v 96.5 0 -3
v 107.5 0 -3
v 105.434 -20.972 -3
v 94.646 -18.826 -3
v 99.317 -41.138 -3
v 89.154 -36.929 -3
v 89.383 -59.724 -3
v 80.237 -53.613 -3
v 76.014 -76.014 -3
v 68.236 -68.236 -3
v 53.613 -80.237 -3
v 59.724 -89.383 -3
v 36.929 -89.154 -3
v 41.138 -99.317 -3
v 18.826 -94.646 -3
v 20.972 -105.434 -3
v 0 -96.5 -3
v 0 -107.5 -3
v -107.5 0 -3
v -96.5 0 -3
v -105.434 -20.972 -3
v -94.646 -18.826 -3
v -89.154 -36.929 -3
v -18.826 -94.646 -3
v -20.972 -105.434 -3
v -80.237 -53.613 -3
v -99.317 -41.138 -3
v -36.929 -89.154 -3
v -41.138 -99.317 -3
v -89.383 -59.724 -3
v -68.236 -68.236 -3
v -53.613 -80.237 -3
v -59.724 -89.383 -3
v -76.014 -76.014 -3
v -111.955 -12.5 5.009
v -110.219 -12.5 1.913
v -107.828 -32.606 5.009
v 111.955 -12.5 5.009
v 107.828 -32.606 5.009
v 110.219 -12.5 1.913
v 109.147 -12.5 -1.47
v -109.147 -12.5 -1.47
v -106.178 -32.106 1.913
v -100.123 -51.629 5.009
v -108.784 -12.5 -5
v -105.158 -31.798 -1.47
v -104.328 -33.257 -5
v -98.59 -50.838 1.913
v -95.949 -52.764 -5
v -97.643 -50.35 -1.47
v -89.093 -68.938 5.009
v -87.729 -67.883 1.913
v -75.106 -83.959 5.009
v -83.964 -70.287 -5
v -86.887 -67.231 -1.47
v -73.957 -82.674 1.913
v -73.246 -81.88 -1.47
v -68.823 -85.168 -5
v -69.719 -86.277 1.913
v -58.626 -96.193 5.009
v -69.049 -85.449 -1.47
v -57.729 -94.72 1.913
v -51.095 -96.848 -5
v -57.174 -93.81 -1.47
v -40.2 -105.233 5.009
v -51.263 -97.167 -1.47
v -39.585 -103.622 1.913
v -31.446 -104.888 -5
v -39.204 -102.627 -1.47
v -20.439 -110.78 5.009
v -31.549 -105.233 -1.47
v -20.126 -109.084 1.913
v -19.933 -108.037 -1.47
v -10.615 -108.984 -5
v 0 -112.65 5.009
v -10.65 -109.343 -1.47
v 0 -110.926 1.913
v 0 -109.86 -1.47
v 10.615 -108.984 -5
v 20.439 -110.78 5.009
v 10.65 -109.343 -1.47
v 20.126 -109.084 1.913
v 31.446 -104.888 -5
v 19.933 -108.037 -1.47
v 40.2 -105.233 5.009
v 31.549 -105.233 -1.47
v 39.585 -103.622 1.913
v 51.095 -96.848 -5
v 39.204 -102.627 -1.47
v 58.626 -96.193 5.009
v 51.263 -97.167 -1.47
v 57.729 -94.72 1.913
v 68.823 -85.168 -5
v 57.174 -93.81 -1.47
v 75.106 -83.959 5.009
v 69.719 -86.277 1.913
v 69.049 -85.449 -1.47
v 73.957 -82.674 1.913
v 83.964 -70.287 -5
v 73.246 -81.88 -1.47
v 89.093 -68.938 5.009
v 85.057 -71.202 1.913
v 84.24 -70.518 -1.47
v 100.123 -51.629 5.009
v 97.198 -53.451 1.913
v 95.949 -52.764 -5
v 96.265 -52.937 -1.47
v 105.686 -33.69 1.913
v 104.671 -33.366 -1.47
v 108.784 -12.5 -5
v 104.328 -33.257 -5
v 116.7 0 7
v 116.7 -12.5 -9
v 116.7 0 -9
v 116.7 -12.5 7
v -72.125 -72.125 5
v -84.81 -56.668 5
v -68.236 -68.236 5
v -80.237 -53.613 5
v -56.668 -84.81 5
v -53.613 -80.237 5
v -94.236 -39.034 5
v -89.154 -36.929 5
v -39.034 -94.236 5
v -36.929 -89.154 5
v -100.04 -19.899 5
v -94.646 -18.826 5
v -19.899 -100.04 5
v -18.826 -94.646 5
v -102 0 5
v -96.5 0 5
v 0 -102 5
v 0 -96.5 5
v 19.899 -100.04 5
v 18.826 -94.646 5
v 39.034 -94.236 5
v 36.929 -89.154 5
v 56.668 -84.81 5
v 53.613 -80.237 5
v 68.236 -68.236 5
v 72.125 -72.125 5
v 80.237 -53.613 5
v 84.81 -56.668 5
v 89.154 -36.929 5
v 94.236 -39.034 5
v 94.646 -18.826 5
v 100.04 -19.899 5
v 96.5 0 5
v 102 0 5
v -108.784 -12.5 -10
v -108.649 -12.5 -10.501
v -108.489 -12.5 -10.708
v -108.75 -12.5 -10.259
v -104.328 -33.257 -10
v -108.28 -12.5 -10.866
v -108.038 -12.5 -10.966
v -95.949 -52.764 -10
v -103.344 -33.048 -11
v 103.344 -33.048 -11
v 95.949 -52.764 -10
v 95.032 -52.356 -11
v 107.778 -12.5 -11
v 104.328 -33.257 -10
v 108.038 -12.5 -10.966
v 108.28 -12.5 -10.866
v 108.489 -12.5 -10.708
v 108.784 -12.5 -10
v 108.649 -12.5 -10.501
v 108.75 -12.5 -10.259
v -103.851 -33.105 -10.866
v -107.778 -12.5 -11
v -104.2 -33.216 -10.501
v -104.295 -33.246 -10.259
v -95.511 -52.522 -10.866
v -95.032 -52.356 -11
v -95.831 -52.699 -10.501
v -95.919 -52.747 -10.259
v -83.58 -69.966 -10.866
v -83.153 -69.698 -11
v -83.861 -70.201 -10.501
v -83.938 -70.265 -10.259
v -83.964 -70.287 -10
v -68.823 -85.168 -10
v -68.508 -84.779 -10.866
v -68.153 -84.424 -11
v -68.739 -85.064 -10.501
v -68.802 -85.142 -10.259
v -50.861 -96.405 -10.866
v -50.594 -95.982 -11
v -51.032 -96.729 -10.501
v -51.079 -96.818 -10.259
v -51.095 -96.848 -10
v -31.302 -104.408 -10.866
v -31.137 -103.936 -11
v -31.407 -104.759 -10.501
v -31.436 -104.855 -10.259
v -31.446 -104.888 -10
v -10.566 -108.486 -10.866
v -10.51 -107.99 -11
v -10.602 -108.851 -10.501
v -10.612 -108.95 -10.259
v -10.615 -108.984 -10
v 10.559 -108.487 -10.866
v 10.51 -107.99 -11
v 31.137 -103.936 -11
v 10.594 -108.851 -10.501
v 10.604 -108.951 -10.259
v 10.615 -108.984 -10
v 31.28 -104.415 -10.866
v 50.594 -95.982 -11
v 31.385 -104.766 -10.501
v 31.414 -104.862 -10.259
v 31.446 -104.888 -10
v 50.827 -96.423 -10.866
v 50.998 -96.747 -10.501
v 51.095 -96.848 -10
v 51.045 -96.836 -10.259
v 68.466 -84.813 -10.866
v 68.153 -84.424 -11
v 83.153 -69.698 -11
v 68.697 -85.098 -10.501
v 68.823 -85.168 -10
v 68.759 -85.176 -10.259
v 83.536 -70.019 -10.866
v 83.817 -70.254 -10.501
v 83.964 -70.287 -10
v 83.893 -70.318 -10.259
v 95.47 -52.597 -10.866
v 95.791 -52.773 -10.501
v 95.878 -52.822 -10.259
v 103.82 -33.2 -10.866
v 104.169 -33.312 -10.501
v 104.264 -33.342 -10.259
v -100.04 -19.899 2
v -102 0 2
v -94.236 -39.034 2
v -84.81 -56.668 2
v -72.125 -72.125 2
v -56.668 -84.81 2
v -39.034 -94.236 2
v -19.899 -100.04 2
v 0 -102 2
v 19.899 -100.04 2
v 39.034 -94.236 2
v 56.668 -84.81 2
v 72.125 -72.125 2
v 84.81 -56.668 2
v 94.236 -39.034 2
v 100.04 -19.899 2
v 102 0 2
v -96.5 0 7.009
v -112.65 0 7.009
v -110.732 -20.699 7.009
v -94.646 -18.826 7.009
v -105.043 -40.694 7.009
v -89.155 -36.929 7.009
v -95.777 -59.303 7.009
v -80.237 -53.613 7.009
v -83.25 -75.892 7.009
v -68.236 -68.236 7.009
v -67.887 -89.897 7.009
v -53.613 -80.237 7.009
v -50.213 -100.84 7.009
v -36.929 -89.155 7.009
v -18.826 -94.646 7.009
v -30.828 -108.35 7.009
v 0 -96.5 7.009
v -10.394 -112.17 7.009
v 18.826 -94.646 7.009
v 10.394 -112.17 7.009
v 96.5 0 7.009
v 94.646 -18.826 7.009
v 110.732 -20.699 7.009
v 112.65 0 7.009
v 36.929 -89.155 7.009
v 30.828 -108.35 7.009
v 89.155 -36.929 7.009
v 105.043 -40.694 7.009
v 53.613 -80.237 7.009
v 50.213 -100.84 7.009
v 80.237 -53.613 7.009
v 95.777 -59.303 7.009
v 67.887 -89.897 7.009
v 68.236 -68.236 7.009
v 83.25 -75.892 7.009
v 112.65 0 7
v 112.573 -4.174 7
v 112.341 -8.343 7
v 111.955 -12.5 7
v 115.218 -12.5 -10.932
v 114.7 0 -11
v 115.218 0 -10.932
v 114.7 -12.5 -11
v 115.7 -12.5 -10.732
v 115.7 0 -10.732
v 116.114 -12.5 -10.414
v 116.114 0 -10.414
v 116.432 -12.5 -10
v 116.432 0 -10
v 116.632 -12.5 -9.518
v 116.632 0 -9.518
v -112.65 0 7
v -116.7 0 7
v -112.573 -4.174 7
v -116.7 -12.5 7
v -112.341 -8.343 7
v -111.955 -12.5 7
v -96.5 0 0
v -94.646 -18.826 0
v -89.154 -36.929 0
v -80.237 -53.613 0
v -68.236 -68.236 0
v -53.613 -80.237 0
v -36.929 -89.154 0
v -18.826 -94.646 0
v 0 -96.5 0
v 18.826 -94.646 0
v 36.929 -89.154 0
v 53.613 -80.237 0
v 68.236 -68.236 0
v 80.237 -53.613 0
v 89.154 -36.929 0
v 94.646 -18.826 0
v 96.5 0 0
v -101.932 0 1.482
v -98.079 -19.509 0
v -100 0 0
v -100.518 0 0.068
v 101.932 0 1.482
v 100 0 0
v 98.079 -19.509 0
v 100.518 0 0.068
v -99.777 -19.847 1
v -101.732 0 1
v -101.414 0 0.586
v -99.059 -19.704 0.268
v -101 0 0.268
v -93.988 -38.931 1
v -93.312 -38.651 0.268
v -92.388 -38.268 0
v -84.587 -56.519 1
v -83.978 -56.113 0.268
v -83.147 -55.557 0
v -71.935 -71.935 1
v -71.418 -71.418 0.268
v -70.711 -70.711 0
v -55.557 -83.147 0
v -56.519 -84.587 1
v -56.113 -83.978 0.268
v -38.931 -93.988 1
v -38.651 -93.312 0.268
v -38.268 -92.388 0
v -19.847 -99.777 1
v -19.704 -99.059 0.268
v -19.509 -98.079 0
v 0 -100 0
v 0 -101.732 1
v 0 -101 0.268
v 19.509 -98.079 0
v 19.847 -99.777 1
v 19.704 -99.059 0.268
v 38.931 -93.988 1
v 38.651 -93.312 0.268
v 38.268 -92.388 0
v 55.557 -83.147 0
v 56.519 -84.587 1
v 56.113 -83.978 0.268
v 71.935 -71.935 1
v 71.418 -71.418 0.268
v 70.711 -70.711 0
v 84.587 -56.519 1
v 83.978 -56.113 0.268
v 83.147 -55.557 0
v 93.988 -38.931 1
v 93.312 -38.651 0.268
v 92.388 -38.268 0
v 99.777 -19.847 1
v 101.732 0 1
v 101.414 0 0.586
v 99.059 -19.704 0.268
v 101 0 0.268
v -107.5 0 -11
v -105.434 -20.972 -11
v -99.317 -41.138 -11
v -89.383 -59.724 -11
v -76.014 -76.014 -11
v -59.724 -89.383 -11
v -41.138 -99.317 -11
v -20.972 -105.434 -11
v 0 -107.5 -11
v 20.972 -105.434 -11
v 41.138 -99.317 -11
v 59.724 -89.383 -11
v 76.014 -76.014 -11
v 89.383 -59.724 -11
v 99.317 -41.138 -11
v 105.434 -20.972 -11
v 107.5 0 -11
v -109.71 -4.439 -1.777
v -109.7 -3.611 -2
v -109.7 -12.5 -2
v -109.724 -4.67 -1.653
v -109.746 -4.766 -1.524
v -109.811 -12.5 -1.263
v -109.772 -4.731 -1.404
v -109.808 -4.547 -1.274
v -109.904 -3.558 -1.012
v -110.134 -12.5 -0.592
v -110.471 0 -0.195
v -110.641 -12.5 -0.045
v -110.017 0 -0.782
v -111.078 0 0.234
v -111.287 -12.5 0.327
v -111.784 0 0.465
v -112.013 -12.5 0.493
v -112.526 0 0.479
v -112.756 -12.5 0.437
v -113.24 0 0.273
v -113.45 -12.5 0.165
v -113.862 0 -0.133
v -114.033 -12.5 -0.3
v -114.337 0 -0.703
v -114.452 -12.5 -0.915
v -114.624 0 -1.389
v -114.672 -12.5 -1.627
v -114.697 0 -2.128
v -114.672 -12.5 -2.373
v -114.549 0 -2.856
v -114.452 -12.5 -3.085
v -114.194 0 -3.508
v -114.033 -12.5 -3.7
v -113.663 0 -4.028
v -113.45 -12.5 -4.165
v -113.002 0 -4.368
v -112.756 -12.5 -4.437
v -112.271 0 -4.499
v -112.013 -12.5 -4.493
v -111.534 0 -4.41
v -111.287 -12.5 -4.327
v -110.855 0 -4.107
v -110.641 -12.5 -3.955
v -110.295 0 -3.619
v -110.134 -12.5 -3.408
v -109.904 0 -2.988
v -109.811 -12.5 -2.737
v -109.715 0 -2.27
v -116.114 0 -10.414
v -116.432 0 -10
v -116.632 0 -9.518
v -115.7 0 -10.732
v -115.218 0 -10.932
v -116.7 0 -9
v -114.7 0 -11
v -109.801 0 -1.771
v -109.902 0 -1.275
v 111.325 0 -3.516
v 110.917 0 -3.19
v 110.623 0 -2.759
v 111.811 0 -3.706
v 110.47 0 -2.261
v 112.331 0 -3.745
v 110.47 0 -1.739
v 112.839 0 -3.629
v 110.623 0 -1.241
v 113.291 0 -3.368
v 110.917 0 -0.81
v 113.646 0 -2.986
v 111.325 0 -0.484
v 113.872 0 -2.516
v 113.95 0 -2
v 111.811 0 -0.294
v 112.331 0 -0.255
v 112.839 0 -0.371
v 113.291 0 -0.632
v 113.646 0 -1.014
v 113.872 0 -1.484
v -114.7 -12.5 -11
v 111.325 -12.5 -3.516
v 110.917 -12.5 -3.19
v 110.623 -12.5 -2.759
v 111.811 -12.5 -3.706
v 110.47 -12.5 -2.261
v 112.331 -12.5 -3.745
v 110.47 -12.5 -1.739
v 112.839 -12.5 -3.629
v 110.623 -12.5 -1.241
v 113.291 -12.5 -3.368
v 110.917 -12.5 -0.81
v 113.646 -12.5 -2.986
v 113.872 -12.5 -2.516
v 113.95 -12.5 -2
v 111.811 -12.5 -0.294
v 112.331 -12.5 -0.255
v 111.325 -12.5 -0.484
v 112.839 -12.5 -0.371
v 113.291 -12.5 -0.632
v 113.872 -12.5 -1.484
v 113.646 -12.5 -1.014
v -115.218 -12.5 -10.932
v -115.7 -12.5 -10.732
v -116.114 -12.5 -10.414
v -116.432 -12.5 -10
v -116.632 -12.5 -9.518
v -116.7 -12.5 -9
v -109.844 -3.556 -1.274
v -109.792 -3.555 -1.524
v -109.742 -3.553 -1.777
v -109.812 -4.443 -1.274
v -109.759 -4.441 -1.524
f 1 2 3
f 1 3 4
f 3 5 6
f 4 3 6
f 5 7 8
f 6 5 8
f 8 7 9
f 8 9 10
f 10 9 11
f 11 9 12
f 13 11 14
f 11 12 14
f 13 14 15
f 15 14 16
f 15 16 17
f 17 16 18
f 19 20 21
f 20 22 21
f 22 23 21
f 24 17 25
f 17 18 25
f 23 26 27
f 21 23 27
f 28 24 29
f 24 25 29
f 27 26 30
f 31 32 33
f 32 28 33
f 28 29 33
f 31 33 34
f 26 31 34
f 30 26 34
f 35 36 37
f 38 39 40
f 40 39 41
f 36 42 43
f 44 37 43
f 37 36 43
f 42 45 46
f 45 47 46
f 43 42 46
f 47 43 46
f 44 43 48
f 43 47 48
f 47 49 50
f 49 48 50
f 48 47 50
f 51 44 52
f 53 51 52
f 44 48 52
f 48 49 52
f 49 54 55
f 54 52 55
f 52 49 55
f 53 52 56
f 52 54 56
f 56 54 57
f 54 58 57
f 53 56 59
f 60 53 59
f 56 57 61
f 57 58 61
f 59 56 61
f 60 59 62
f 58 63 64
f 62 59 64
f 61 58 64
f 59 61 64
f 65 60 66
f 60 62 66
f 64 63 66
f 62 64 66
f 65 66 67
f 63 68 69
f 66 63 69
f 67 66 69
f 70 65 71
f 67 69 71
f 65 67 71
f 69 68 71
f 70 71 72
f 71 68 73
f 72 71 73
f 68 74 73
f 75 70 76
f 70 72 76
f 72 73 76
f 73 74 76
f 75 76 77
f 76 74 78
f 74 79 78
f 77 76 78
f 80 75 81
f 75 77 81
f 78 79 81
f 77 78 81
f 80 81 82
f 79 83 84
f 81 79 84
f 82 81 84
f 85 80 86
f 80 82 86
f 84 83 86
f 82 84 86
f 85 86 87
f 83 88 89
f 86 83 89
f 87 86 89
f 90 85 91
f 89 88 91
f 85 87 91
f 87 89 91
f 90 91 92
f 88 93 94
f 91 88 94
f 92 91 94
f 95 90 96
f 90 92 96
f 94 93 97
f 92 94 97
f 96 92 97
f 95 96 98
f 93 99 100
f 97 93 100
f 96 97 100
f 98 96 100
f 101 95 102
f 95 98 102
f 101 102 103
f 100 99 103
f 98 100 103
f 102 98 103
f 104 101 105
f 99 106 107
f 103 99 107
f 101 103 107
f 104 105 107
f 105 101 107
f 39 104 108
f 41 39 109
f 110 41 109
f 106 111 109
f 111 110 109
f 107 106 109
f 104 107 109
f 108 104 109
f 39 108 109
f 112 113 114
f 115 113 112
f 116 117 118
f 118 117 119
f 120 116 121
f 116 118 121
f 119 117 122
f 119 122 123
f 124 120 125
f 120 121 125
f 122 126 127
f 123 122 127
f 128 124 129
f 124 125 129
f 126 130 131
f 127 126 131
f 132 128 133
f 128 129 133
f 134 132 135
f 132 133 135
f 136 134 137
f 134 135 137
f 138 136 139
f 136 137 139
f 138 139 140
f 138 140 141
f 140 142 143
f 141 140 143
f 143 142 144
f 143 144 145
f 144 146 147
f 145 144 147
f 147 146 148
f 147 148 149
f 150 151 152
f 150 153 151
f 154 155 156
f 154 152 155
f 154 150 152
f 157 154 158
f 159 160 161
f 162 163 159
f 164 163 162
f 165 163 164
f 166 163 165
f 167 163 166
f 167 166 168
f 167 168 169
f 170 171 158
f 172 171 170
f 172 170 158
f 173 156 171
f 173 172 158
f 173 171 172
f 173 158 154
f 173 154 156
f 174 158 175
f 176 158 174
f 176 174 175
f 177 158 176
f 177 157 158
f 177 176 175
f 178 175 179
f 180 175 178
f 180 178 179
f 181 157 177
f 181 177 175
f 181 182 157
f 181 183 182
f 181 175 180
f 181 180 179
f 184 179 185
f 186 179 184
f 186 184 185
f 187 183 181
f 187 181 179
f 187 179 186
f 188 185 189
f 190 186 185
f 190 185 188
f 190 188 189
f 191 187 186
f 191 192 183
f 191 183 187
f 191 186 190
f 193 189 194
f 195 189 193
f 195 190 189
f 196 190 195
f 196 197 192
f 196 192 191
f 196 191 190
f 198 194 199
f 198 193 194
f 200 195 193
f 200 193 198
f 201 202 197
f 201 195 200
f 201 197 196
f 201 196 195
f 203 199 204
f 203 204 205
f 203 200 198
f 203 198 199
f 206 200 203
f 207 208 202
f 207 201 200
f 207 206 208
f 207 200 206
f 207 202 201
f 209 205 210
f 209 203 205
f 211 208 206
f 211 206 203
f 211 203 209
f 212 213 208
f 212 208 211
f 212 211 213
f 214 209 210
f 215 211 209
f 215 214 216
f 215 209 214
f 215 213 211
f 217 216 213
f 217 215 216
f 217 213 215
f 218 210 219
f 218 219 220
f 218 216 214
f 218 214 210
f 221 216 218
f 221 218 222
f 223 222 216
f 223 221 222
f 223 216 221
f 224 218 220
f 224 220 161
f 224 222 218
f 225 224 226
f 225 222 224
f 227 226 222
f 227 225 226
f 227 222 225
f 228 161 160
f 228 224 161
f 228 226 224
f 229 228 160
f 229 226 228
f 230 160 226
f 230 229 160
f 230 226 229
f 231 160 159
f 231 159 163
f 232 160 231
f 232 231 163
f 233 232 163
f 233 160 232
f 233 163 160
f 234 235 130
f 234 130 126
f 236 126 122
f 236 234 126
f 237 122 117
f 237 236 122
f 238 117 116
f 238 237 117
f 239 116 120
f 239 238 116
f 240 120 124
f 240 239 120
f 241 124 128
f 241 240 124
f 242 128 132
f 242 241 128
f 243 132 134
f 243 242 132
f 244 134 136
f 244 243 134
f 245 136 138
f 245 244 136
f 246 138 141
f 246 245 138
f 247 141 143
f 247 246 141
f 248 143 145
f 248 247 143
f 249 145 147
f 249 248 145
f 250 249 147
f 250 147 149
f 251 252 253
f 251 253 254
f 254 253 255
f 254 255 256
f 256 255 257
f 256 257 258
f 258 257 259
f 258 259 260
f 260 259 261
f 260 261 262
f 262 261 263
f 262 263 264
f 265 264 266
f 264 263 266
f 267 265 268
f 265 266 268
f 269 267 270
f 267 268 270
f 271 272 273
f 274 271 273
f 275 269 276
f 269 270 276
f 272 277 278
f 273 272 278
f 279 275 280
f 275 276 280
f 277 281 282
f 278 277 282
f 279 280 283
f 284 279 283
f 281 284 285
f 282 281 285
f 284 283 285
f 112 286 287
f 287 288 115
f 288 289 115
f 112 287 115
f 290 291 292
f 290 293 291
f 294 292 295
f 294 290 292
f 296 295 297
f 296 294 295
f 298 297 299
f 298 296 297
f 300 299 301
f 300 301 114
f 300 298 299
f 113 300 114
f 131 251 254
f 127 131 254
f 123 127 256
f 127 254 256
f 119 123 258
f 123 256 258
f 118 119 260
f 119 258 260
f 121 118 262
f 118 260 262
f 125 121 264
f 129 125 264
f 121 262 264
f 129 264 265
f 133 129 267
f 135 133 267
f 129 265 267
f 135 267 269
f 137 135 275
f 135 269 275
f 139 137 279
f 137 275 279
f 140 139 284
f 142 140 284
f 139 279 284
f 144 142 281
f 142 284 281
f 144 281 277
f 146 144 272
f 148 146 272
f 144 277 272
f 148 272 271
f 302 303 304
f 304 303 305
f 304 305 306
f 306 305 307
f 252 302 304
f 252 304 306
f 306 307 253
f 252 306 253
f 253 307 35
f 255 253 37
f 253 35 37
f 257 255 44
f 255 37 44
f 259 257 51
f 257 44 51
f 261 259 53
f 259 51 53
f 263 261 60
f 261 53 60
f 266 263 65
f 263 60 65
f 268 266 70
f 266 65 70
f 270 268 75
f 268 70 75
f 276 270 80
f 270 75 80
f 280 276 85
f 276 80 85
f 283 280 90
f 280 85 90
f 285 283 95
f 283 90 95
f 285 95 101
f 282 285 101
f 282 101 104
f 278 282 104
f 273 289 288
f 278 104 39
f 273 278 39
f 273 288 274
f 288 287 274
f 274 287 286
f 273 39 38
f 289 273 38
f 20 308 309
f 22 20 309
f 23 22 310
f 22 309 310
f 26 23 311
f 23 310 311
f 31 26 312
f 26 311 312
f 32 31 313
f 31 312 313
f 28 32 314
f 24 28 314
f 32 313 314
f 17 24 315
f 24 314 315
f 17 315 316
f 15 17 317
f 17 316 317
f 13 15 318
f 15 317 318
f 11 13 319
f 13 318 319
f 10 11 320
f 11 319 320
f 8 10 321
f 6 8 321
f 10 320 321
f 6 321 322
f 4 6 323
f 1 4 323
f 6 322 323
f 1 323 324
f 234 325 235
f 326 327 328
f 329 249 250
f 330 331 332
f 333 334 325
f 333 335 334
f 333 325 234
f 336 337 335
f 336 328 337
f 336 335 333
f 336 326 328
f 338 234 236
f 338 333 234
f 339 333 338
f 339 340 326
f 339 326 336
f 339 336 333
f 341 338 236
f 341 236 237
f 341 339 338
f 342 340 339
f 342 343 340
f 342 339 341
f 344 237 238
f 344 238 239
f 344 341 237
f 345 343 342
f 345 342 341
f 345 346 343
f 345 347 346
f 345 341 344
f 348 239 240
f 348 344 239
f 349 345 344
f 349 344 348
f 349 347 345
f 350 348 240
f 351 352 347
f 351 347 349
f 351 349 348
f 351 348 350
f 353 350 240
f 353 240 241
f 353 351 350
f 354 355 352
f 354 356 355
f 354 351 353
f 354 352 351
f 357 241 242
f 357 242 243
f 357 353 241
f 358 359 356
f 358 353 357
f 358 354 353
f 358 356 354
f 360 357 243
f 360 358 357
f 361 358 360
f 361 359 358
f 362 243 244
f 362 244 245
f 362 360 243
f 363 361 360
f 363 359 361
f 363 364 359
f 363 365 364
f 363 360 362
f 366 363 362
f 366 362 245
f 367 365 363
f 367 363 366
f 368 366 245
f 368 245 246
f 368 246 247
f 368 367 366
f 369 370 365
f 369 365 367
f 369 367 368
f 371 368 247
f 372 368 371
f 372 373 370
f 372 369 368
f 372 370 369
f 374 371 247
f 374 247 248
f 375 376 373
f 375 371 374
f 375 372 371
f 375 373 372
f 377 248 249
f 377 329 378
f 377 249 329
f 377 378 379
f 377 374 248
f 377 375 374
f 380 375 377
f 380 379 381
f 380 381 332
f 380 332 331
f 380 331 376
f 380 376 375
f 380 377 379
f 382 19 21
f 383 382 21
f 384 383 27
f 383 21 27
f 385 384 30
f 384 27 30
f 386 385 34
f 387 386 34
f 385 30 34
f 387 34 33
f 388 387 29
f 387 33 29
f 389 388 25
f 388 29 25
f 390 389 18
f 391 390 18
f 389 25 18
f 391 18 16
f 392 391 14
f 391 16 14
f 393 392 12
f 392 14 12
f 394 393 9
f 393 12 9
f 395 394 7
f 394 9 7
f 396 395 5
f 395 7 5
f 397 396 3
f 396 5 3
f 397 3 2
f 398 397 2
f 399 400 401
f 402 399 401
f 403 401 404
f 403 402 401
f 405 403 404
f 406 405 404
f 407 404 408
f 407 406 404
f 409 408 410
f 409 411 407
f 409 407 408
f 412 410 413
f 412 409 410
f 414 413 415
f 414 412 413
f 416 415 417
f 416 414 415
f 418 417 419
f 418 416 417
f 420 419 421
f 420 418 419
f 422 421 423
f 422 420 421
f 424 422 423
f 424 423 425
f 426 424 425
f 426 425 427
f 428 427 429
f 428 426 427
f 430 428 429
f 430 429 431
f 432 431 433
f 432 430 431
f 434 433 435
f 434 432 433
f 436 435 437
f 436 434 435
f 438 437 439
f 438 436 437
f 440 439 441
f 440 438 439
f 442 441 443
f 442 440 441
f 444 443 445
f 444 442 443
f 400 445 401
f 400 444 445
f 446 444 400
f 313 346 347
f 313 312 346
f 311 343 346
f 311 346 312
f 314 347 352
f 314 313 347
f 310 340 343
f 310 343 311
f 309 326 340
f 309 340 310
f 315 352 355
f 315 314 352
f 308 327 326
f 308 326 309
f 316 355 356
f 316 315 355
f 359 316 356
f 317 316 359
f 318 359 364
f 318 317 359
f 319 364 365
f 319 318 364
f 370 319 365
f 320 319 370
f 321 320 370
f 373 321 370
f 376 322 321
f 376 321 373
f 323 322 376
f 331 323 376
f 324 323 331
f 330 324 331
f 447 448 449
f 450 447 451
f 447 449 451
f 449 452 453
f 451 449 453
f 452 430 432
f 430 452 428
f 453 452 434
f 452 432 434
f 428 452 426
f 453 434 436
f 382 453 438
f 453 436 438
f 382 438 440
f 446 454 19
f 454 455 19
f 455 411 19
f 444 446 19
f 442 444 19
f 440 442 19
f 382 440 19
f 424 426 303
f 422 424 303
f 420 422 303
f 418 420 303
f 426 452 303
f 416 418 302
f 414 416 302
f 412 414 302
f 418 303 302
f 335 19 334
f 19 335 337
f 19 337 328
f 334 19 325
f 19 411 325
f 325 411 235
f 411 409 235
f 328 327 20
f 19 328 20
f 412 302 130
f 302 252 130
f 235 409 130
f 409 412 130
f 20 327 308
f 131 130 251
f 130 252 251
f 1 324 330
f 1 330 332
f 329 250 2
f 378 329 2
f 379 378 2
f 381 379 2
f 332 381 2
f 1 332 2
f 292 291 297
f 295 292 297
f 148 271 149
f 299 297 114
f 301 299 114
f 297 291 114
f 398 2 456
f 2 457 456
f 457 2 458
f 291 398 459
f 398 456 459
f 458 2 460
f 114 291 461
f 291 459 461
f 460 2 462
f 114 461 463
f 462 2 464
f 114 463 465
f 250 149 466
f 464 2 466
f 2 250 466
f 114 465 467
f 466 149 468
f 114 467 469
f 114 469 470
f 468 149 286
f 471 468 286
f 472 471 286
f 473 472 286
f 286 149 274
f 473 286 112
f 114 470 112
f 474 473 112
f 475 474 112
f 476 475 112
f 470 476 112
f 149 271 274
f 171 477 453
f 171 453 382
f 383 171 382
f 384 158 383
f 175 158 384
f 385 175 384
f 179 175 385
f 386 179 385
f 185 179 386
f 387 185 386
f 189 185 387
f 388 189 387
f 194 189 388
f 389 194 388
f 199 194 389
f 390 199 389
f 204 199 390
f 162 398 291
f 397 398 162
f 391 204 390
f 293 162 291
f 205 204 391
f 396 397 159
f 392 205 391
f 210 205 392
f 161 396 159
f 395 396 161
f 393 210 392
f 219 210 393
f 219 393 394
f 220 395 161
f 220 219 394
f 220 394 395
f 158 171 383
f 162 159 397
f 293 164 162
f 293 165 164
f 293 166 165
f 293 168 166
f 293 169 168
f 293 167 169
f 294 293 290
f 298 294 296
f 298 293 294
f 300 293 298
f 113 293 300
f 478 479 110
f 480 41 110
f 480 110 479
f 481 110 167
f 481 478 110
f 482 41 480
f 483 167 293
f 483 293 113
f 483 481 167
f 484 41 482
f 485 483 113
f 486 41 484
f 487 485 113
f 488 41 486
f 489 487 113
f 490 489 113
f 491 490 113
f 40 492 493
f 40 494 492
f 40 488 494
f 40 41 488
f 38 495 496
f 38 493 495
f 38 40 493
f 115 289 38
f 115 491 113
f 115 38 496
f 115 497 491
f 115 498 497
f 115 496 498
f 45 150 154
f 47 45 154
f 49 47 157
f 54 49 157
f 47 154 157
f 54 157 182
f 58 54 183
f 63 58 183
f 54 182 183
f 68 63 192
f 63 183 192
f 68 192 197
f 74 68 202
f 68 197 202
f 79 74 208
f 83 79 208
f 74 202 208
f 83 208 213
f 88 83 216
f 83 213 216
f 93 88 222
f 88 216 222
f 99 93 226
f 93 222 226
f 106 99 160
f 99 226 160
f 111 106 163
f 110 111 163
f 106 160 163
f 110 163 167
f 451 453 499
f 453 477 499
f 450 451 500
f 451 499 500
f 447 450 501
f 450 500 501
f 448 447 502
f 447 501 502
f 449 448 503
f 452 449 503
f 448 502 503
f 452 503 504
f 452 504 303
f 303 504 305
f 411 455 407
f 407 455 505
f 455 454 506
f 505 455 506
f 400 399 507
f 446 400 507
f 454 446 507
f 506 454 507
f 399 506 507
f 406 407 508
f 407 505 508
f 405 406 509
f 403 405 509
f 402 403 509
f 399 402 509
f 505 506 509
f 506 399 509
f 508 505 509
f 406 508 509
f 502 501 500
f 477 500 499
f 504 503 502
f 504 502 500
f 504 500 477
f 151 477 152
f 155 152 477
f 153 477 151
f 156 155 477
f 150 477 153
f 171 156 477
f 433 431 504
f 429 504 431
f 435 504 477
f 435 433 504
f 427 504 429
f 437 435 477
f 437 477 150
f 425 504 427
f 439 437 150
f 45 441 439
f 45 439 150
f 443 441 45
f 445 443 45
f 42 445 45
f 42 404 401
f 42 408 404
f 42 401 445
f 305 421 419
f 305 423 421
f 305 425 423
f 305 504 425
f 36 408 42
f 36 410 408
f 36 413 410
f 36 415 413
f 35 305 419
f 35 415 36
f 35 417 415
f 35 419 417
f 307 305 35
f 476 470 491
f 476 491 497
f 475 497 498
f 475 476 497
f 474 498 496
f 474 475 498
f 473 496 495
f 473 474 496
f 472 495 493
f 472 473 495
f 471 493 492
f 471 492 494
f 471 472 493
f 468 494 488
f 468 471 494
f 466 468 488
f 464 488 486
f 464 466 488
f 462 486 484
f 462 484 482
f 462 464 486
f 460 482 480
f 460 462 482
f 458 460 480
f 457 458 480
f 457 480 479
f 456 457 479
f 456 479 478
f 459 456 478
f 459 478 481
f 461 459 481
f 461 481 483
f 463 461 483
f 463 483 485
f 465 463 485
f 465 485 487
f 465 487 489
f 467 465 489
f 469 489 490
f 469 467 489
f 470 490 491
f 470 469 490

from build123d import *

# Parameters (mm, degrees)
F2_R      = 102
F3_DEPTH  = 5
F4_R      = 1
F5_W      = 9
F5_H      = 18
F5_R      = 2.5
F7_DEPTH  = 12.5
F6_W      = 9
F6_H      = 18
F6_R      = 1.75
F8_DEPTH  = 12.5
F9_W      = 250
F9_H      = 100
F10_DEPTH = 150
F11_R     = 2
F12_R     = 2


with BuildPart() as f1:
    # F0 (on Front) → F1 (revolve)
    with BuildSketch(Plane.XZ):
        with BuildLine():
            Line((-107.5, -3), (-96.5, -3))
            Line((-96.5, -3), (-96.5000625723, 0))
            Line((-96.5000625723, 0), (-96.5002087619, 7.009))
            Line((-96.5002087619, 7.009), (-112.6502087619, 7.009))
            Line((-112.6502087619, 7.009), (-112.6502087619, 5.009))
            ThreePointArc((-112.6502087619, 5.009), (-110.3061458059, 0.2465201859), (-109.5, -5))
            Line((-109.5, -5), (-109.5, -11))
            Line((-109.5, -11), (-107.5, -11))
            Line((-107.5, -11), (-107.5, -3))
        make_face()
    revolve(axis=Axis((0, 0, -0.2650997043), (0, 0, 1)))

    # F2 (on Top) → F3 (cut)
    with BuildSketch(Plane.XY):
        Circle(F2_R)
    extrude(amount=F3_DEPTH, mode=Mode.SUBTRACT)

    # F4
    f4_edges = [f1.edges().sort_by_distance(p)[0] for p in [
        (109.5, 0, -11),
    ]]
    fillet(f4_edges, radius=F4_R)

    # F5 (on Front) → F7 (join, symmetric)
    with BuildSketch(Plane.XZ):
        with Locations((-112.2, -2)):
            Rectangle(F5_W, F5_H)
        with Locations((-112.2, -2)):
            Circle(F5_R, mode=Mode.SUBTRACT)
    extrude(amount=F7_DEPTH, both=True)

    # F6 (on Front) → F8 (join, symmetric)
    with BuildSketch(Plane.XZ):
        with Locations((112.2, -2)):
            Rectangle(F6_W, F6_H)
        with Locations((112.2, -2)):
            Circle(F6_R, mode=Mode.SUBTRACT)
    extrude(amount=F8_DEPTH, both=True)

    # F9 (on Front) → F10 (cut)
    with BuildSketch(Plane.XZ):
        with Locations((0.1239156971, -32.2915658355)):
            Rectangle(F9_W, F9_H)
    extrude(amount=-F10_DEPTH, mode=Mode.SUBTRACT)

    # F11
    f11_edges = [f1.edges().sort_by_distance(p)[0] for p in [
        (0, -102, 0),
    ]]
    fillet(f11_edges, radius=F11_R)

    # F12
    f12_edges = [f1.edges().sort_by_distance(p)[0] for p in [
        (116.7, -6.25, -11),
        (-116.7, -6.25, -11),
    ]]
    fillet(f12_edges, radius=F12_R)


solid = f1.part
